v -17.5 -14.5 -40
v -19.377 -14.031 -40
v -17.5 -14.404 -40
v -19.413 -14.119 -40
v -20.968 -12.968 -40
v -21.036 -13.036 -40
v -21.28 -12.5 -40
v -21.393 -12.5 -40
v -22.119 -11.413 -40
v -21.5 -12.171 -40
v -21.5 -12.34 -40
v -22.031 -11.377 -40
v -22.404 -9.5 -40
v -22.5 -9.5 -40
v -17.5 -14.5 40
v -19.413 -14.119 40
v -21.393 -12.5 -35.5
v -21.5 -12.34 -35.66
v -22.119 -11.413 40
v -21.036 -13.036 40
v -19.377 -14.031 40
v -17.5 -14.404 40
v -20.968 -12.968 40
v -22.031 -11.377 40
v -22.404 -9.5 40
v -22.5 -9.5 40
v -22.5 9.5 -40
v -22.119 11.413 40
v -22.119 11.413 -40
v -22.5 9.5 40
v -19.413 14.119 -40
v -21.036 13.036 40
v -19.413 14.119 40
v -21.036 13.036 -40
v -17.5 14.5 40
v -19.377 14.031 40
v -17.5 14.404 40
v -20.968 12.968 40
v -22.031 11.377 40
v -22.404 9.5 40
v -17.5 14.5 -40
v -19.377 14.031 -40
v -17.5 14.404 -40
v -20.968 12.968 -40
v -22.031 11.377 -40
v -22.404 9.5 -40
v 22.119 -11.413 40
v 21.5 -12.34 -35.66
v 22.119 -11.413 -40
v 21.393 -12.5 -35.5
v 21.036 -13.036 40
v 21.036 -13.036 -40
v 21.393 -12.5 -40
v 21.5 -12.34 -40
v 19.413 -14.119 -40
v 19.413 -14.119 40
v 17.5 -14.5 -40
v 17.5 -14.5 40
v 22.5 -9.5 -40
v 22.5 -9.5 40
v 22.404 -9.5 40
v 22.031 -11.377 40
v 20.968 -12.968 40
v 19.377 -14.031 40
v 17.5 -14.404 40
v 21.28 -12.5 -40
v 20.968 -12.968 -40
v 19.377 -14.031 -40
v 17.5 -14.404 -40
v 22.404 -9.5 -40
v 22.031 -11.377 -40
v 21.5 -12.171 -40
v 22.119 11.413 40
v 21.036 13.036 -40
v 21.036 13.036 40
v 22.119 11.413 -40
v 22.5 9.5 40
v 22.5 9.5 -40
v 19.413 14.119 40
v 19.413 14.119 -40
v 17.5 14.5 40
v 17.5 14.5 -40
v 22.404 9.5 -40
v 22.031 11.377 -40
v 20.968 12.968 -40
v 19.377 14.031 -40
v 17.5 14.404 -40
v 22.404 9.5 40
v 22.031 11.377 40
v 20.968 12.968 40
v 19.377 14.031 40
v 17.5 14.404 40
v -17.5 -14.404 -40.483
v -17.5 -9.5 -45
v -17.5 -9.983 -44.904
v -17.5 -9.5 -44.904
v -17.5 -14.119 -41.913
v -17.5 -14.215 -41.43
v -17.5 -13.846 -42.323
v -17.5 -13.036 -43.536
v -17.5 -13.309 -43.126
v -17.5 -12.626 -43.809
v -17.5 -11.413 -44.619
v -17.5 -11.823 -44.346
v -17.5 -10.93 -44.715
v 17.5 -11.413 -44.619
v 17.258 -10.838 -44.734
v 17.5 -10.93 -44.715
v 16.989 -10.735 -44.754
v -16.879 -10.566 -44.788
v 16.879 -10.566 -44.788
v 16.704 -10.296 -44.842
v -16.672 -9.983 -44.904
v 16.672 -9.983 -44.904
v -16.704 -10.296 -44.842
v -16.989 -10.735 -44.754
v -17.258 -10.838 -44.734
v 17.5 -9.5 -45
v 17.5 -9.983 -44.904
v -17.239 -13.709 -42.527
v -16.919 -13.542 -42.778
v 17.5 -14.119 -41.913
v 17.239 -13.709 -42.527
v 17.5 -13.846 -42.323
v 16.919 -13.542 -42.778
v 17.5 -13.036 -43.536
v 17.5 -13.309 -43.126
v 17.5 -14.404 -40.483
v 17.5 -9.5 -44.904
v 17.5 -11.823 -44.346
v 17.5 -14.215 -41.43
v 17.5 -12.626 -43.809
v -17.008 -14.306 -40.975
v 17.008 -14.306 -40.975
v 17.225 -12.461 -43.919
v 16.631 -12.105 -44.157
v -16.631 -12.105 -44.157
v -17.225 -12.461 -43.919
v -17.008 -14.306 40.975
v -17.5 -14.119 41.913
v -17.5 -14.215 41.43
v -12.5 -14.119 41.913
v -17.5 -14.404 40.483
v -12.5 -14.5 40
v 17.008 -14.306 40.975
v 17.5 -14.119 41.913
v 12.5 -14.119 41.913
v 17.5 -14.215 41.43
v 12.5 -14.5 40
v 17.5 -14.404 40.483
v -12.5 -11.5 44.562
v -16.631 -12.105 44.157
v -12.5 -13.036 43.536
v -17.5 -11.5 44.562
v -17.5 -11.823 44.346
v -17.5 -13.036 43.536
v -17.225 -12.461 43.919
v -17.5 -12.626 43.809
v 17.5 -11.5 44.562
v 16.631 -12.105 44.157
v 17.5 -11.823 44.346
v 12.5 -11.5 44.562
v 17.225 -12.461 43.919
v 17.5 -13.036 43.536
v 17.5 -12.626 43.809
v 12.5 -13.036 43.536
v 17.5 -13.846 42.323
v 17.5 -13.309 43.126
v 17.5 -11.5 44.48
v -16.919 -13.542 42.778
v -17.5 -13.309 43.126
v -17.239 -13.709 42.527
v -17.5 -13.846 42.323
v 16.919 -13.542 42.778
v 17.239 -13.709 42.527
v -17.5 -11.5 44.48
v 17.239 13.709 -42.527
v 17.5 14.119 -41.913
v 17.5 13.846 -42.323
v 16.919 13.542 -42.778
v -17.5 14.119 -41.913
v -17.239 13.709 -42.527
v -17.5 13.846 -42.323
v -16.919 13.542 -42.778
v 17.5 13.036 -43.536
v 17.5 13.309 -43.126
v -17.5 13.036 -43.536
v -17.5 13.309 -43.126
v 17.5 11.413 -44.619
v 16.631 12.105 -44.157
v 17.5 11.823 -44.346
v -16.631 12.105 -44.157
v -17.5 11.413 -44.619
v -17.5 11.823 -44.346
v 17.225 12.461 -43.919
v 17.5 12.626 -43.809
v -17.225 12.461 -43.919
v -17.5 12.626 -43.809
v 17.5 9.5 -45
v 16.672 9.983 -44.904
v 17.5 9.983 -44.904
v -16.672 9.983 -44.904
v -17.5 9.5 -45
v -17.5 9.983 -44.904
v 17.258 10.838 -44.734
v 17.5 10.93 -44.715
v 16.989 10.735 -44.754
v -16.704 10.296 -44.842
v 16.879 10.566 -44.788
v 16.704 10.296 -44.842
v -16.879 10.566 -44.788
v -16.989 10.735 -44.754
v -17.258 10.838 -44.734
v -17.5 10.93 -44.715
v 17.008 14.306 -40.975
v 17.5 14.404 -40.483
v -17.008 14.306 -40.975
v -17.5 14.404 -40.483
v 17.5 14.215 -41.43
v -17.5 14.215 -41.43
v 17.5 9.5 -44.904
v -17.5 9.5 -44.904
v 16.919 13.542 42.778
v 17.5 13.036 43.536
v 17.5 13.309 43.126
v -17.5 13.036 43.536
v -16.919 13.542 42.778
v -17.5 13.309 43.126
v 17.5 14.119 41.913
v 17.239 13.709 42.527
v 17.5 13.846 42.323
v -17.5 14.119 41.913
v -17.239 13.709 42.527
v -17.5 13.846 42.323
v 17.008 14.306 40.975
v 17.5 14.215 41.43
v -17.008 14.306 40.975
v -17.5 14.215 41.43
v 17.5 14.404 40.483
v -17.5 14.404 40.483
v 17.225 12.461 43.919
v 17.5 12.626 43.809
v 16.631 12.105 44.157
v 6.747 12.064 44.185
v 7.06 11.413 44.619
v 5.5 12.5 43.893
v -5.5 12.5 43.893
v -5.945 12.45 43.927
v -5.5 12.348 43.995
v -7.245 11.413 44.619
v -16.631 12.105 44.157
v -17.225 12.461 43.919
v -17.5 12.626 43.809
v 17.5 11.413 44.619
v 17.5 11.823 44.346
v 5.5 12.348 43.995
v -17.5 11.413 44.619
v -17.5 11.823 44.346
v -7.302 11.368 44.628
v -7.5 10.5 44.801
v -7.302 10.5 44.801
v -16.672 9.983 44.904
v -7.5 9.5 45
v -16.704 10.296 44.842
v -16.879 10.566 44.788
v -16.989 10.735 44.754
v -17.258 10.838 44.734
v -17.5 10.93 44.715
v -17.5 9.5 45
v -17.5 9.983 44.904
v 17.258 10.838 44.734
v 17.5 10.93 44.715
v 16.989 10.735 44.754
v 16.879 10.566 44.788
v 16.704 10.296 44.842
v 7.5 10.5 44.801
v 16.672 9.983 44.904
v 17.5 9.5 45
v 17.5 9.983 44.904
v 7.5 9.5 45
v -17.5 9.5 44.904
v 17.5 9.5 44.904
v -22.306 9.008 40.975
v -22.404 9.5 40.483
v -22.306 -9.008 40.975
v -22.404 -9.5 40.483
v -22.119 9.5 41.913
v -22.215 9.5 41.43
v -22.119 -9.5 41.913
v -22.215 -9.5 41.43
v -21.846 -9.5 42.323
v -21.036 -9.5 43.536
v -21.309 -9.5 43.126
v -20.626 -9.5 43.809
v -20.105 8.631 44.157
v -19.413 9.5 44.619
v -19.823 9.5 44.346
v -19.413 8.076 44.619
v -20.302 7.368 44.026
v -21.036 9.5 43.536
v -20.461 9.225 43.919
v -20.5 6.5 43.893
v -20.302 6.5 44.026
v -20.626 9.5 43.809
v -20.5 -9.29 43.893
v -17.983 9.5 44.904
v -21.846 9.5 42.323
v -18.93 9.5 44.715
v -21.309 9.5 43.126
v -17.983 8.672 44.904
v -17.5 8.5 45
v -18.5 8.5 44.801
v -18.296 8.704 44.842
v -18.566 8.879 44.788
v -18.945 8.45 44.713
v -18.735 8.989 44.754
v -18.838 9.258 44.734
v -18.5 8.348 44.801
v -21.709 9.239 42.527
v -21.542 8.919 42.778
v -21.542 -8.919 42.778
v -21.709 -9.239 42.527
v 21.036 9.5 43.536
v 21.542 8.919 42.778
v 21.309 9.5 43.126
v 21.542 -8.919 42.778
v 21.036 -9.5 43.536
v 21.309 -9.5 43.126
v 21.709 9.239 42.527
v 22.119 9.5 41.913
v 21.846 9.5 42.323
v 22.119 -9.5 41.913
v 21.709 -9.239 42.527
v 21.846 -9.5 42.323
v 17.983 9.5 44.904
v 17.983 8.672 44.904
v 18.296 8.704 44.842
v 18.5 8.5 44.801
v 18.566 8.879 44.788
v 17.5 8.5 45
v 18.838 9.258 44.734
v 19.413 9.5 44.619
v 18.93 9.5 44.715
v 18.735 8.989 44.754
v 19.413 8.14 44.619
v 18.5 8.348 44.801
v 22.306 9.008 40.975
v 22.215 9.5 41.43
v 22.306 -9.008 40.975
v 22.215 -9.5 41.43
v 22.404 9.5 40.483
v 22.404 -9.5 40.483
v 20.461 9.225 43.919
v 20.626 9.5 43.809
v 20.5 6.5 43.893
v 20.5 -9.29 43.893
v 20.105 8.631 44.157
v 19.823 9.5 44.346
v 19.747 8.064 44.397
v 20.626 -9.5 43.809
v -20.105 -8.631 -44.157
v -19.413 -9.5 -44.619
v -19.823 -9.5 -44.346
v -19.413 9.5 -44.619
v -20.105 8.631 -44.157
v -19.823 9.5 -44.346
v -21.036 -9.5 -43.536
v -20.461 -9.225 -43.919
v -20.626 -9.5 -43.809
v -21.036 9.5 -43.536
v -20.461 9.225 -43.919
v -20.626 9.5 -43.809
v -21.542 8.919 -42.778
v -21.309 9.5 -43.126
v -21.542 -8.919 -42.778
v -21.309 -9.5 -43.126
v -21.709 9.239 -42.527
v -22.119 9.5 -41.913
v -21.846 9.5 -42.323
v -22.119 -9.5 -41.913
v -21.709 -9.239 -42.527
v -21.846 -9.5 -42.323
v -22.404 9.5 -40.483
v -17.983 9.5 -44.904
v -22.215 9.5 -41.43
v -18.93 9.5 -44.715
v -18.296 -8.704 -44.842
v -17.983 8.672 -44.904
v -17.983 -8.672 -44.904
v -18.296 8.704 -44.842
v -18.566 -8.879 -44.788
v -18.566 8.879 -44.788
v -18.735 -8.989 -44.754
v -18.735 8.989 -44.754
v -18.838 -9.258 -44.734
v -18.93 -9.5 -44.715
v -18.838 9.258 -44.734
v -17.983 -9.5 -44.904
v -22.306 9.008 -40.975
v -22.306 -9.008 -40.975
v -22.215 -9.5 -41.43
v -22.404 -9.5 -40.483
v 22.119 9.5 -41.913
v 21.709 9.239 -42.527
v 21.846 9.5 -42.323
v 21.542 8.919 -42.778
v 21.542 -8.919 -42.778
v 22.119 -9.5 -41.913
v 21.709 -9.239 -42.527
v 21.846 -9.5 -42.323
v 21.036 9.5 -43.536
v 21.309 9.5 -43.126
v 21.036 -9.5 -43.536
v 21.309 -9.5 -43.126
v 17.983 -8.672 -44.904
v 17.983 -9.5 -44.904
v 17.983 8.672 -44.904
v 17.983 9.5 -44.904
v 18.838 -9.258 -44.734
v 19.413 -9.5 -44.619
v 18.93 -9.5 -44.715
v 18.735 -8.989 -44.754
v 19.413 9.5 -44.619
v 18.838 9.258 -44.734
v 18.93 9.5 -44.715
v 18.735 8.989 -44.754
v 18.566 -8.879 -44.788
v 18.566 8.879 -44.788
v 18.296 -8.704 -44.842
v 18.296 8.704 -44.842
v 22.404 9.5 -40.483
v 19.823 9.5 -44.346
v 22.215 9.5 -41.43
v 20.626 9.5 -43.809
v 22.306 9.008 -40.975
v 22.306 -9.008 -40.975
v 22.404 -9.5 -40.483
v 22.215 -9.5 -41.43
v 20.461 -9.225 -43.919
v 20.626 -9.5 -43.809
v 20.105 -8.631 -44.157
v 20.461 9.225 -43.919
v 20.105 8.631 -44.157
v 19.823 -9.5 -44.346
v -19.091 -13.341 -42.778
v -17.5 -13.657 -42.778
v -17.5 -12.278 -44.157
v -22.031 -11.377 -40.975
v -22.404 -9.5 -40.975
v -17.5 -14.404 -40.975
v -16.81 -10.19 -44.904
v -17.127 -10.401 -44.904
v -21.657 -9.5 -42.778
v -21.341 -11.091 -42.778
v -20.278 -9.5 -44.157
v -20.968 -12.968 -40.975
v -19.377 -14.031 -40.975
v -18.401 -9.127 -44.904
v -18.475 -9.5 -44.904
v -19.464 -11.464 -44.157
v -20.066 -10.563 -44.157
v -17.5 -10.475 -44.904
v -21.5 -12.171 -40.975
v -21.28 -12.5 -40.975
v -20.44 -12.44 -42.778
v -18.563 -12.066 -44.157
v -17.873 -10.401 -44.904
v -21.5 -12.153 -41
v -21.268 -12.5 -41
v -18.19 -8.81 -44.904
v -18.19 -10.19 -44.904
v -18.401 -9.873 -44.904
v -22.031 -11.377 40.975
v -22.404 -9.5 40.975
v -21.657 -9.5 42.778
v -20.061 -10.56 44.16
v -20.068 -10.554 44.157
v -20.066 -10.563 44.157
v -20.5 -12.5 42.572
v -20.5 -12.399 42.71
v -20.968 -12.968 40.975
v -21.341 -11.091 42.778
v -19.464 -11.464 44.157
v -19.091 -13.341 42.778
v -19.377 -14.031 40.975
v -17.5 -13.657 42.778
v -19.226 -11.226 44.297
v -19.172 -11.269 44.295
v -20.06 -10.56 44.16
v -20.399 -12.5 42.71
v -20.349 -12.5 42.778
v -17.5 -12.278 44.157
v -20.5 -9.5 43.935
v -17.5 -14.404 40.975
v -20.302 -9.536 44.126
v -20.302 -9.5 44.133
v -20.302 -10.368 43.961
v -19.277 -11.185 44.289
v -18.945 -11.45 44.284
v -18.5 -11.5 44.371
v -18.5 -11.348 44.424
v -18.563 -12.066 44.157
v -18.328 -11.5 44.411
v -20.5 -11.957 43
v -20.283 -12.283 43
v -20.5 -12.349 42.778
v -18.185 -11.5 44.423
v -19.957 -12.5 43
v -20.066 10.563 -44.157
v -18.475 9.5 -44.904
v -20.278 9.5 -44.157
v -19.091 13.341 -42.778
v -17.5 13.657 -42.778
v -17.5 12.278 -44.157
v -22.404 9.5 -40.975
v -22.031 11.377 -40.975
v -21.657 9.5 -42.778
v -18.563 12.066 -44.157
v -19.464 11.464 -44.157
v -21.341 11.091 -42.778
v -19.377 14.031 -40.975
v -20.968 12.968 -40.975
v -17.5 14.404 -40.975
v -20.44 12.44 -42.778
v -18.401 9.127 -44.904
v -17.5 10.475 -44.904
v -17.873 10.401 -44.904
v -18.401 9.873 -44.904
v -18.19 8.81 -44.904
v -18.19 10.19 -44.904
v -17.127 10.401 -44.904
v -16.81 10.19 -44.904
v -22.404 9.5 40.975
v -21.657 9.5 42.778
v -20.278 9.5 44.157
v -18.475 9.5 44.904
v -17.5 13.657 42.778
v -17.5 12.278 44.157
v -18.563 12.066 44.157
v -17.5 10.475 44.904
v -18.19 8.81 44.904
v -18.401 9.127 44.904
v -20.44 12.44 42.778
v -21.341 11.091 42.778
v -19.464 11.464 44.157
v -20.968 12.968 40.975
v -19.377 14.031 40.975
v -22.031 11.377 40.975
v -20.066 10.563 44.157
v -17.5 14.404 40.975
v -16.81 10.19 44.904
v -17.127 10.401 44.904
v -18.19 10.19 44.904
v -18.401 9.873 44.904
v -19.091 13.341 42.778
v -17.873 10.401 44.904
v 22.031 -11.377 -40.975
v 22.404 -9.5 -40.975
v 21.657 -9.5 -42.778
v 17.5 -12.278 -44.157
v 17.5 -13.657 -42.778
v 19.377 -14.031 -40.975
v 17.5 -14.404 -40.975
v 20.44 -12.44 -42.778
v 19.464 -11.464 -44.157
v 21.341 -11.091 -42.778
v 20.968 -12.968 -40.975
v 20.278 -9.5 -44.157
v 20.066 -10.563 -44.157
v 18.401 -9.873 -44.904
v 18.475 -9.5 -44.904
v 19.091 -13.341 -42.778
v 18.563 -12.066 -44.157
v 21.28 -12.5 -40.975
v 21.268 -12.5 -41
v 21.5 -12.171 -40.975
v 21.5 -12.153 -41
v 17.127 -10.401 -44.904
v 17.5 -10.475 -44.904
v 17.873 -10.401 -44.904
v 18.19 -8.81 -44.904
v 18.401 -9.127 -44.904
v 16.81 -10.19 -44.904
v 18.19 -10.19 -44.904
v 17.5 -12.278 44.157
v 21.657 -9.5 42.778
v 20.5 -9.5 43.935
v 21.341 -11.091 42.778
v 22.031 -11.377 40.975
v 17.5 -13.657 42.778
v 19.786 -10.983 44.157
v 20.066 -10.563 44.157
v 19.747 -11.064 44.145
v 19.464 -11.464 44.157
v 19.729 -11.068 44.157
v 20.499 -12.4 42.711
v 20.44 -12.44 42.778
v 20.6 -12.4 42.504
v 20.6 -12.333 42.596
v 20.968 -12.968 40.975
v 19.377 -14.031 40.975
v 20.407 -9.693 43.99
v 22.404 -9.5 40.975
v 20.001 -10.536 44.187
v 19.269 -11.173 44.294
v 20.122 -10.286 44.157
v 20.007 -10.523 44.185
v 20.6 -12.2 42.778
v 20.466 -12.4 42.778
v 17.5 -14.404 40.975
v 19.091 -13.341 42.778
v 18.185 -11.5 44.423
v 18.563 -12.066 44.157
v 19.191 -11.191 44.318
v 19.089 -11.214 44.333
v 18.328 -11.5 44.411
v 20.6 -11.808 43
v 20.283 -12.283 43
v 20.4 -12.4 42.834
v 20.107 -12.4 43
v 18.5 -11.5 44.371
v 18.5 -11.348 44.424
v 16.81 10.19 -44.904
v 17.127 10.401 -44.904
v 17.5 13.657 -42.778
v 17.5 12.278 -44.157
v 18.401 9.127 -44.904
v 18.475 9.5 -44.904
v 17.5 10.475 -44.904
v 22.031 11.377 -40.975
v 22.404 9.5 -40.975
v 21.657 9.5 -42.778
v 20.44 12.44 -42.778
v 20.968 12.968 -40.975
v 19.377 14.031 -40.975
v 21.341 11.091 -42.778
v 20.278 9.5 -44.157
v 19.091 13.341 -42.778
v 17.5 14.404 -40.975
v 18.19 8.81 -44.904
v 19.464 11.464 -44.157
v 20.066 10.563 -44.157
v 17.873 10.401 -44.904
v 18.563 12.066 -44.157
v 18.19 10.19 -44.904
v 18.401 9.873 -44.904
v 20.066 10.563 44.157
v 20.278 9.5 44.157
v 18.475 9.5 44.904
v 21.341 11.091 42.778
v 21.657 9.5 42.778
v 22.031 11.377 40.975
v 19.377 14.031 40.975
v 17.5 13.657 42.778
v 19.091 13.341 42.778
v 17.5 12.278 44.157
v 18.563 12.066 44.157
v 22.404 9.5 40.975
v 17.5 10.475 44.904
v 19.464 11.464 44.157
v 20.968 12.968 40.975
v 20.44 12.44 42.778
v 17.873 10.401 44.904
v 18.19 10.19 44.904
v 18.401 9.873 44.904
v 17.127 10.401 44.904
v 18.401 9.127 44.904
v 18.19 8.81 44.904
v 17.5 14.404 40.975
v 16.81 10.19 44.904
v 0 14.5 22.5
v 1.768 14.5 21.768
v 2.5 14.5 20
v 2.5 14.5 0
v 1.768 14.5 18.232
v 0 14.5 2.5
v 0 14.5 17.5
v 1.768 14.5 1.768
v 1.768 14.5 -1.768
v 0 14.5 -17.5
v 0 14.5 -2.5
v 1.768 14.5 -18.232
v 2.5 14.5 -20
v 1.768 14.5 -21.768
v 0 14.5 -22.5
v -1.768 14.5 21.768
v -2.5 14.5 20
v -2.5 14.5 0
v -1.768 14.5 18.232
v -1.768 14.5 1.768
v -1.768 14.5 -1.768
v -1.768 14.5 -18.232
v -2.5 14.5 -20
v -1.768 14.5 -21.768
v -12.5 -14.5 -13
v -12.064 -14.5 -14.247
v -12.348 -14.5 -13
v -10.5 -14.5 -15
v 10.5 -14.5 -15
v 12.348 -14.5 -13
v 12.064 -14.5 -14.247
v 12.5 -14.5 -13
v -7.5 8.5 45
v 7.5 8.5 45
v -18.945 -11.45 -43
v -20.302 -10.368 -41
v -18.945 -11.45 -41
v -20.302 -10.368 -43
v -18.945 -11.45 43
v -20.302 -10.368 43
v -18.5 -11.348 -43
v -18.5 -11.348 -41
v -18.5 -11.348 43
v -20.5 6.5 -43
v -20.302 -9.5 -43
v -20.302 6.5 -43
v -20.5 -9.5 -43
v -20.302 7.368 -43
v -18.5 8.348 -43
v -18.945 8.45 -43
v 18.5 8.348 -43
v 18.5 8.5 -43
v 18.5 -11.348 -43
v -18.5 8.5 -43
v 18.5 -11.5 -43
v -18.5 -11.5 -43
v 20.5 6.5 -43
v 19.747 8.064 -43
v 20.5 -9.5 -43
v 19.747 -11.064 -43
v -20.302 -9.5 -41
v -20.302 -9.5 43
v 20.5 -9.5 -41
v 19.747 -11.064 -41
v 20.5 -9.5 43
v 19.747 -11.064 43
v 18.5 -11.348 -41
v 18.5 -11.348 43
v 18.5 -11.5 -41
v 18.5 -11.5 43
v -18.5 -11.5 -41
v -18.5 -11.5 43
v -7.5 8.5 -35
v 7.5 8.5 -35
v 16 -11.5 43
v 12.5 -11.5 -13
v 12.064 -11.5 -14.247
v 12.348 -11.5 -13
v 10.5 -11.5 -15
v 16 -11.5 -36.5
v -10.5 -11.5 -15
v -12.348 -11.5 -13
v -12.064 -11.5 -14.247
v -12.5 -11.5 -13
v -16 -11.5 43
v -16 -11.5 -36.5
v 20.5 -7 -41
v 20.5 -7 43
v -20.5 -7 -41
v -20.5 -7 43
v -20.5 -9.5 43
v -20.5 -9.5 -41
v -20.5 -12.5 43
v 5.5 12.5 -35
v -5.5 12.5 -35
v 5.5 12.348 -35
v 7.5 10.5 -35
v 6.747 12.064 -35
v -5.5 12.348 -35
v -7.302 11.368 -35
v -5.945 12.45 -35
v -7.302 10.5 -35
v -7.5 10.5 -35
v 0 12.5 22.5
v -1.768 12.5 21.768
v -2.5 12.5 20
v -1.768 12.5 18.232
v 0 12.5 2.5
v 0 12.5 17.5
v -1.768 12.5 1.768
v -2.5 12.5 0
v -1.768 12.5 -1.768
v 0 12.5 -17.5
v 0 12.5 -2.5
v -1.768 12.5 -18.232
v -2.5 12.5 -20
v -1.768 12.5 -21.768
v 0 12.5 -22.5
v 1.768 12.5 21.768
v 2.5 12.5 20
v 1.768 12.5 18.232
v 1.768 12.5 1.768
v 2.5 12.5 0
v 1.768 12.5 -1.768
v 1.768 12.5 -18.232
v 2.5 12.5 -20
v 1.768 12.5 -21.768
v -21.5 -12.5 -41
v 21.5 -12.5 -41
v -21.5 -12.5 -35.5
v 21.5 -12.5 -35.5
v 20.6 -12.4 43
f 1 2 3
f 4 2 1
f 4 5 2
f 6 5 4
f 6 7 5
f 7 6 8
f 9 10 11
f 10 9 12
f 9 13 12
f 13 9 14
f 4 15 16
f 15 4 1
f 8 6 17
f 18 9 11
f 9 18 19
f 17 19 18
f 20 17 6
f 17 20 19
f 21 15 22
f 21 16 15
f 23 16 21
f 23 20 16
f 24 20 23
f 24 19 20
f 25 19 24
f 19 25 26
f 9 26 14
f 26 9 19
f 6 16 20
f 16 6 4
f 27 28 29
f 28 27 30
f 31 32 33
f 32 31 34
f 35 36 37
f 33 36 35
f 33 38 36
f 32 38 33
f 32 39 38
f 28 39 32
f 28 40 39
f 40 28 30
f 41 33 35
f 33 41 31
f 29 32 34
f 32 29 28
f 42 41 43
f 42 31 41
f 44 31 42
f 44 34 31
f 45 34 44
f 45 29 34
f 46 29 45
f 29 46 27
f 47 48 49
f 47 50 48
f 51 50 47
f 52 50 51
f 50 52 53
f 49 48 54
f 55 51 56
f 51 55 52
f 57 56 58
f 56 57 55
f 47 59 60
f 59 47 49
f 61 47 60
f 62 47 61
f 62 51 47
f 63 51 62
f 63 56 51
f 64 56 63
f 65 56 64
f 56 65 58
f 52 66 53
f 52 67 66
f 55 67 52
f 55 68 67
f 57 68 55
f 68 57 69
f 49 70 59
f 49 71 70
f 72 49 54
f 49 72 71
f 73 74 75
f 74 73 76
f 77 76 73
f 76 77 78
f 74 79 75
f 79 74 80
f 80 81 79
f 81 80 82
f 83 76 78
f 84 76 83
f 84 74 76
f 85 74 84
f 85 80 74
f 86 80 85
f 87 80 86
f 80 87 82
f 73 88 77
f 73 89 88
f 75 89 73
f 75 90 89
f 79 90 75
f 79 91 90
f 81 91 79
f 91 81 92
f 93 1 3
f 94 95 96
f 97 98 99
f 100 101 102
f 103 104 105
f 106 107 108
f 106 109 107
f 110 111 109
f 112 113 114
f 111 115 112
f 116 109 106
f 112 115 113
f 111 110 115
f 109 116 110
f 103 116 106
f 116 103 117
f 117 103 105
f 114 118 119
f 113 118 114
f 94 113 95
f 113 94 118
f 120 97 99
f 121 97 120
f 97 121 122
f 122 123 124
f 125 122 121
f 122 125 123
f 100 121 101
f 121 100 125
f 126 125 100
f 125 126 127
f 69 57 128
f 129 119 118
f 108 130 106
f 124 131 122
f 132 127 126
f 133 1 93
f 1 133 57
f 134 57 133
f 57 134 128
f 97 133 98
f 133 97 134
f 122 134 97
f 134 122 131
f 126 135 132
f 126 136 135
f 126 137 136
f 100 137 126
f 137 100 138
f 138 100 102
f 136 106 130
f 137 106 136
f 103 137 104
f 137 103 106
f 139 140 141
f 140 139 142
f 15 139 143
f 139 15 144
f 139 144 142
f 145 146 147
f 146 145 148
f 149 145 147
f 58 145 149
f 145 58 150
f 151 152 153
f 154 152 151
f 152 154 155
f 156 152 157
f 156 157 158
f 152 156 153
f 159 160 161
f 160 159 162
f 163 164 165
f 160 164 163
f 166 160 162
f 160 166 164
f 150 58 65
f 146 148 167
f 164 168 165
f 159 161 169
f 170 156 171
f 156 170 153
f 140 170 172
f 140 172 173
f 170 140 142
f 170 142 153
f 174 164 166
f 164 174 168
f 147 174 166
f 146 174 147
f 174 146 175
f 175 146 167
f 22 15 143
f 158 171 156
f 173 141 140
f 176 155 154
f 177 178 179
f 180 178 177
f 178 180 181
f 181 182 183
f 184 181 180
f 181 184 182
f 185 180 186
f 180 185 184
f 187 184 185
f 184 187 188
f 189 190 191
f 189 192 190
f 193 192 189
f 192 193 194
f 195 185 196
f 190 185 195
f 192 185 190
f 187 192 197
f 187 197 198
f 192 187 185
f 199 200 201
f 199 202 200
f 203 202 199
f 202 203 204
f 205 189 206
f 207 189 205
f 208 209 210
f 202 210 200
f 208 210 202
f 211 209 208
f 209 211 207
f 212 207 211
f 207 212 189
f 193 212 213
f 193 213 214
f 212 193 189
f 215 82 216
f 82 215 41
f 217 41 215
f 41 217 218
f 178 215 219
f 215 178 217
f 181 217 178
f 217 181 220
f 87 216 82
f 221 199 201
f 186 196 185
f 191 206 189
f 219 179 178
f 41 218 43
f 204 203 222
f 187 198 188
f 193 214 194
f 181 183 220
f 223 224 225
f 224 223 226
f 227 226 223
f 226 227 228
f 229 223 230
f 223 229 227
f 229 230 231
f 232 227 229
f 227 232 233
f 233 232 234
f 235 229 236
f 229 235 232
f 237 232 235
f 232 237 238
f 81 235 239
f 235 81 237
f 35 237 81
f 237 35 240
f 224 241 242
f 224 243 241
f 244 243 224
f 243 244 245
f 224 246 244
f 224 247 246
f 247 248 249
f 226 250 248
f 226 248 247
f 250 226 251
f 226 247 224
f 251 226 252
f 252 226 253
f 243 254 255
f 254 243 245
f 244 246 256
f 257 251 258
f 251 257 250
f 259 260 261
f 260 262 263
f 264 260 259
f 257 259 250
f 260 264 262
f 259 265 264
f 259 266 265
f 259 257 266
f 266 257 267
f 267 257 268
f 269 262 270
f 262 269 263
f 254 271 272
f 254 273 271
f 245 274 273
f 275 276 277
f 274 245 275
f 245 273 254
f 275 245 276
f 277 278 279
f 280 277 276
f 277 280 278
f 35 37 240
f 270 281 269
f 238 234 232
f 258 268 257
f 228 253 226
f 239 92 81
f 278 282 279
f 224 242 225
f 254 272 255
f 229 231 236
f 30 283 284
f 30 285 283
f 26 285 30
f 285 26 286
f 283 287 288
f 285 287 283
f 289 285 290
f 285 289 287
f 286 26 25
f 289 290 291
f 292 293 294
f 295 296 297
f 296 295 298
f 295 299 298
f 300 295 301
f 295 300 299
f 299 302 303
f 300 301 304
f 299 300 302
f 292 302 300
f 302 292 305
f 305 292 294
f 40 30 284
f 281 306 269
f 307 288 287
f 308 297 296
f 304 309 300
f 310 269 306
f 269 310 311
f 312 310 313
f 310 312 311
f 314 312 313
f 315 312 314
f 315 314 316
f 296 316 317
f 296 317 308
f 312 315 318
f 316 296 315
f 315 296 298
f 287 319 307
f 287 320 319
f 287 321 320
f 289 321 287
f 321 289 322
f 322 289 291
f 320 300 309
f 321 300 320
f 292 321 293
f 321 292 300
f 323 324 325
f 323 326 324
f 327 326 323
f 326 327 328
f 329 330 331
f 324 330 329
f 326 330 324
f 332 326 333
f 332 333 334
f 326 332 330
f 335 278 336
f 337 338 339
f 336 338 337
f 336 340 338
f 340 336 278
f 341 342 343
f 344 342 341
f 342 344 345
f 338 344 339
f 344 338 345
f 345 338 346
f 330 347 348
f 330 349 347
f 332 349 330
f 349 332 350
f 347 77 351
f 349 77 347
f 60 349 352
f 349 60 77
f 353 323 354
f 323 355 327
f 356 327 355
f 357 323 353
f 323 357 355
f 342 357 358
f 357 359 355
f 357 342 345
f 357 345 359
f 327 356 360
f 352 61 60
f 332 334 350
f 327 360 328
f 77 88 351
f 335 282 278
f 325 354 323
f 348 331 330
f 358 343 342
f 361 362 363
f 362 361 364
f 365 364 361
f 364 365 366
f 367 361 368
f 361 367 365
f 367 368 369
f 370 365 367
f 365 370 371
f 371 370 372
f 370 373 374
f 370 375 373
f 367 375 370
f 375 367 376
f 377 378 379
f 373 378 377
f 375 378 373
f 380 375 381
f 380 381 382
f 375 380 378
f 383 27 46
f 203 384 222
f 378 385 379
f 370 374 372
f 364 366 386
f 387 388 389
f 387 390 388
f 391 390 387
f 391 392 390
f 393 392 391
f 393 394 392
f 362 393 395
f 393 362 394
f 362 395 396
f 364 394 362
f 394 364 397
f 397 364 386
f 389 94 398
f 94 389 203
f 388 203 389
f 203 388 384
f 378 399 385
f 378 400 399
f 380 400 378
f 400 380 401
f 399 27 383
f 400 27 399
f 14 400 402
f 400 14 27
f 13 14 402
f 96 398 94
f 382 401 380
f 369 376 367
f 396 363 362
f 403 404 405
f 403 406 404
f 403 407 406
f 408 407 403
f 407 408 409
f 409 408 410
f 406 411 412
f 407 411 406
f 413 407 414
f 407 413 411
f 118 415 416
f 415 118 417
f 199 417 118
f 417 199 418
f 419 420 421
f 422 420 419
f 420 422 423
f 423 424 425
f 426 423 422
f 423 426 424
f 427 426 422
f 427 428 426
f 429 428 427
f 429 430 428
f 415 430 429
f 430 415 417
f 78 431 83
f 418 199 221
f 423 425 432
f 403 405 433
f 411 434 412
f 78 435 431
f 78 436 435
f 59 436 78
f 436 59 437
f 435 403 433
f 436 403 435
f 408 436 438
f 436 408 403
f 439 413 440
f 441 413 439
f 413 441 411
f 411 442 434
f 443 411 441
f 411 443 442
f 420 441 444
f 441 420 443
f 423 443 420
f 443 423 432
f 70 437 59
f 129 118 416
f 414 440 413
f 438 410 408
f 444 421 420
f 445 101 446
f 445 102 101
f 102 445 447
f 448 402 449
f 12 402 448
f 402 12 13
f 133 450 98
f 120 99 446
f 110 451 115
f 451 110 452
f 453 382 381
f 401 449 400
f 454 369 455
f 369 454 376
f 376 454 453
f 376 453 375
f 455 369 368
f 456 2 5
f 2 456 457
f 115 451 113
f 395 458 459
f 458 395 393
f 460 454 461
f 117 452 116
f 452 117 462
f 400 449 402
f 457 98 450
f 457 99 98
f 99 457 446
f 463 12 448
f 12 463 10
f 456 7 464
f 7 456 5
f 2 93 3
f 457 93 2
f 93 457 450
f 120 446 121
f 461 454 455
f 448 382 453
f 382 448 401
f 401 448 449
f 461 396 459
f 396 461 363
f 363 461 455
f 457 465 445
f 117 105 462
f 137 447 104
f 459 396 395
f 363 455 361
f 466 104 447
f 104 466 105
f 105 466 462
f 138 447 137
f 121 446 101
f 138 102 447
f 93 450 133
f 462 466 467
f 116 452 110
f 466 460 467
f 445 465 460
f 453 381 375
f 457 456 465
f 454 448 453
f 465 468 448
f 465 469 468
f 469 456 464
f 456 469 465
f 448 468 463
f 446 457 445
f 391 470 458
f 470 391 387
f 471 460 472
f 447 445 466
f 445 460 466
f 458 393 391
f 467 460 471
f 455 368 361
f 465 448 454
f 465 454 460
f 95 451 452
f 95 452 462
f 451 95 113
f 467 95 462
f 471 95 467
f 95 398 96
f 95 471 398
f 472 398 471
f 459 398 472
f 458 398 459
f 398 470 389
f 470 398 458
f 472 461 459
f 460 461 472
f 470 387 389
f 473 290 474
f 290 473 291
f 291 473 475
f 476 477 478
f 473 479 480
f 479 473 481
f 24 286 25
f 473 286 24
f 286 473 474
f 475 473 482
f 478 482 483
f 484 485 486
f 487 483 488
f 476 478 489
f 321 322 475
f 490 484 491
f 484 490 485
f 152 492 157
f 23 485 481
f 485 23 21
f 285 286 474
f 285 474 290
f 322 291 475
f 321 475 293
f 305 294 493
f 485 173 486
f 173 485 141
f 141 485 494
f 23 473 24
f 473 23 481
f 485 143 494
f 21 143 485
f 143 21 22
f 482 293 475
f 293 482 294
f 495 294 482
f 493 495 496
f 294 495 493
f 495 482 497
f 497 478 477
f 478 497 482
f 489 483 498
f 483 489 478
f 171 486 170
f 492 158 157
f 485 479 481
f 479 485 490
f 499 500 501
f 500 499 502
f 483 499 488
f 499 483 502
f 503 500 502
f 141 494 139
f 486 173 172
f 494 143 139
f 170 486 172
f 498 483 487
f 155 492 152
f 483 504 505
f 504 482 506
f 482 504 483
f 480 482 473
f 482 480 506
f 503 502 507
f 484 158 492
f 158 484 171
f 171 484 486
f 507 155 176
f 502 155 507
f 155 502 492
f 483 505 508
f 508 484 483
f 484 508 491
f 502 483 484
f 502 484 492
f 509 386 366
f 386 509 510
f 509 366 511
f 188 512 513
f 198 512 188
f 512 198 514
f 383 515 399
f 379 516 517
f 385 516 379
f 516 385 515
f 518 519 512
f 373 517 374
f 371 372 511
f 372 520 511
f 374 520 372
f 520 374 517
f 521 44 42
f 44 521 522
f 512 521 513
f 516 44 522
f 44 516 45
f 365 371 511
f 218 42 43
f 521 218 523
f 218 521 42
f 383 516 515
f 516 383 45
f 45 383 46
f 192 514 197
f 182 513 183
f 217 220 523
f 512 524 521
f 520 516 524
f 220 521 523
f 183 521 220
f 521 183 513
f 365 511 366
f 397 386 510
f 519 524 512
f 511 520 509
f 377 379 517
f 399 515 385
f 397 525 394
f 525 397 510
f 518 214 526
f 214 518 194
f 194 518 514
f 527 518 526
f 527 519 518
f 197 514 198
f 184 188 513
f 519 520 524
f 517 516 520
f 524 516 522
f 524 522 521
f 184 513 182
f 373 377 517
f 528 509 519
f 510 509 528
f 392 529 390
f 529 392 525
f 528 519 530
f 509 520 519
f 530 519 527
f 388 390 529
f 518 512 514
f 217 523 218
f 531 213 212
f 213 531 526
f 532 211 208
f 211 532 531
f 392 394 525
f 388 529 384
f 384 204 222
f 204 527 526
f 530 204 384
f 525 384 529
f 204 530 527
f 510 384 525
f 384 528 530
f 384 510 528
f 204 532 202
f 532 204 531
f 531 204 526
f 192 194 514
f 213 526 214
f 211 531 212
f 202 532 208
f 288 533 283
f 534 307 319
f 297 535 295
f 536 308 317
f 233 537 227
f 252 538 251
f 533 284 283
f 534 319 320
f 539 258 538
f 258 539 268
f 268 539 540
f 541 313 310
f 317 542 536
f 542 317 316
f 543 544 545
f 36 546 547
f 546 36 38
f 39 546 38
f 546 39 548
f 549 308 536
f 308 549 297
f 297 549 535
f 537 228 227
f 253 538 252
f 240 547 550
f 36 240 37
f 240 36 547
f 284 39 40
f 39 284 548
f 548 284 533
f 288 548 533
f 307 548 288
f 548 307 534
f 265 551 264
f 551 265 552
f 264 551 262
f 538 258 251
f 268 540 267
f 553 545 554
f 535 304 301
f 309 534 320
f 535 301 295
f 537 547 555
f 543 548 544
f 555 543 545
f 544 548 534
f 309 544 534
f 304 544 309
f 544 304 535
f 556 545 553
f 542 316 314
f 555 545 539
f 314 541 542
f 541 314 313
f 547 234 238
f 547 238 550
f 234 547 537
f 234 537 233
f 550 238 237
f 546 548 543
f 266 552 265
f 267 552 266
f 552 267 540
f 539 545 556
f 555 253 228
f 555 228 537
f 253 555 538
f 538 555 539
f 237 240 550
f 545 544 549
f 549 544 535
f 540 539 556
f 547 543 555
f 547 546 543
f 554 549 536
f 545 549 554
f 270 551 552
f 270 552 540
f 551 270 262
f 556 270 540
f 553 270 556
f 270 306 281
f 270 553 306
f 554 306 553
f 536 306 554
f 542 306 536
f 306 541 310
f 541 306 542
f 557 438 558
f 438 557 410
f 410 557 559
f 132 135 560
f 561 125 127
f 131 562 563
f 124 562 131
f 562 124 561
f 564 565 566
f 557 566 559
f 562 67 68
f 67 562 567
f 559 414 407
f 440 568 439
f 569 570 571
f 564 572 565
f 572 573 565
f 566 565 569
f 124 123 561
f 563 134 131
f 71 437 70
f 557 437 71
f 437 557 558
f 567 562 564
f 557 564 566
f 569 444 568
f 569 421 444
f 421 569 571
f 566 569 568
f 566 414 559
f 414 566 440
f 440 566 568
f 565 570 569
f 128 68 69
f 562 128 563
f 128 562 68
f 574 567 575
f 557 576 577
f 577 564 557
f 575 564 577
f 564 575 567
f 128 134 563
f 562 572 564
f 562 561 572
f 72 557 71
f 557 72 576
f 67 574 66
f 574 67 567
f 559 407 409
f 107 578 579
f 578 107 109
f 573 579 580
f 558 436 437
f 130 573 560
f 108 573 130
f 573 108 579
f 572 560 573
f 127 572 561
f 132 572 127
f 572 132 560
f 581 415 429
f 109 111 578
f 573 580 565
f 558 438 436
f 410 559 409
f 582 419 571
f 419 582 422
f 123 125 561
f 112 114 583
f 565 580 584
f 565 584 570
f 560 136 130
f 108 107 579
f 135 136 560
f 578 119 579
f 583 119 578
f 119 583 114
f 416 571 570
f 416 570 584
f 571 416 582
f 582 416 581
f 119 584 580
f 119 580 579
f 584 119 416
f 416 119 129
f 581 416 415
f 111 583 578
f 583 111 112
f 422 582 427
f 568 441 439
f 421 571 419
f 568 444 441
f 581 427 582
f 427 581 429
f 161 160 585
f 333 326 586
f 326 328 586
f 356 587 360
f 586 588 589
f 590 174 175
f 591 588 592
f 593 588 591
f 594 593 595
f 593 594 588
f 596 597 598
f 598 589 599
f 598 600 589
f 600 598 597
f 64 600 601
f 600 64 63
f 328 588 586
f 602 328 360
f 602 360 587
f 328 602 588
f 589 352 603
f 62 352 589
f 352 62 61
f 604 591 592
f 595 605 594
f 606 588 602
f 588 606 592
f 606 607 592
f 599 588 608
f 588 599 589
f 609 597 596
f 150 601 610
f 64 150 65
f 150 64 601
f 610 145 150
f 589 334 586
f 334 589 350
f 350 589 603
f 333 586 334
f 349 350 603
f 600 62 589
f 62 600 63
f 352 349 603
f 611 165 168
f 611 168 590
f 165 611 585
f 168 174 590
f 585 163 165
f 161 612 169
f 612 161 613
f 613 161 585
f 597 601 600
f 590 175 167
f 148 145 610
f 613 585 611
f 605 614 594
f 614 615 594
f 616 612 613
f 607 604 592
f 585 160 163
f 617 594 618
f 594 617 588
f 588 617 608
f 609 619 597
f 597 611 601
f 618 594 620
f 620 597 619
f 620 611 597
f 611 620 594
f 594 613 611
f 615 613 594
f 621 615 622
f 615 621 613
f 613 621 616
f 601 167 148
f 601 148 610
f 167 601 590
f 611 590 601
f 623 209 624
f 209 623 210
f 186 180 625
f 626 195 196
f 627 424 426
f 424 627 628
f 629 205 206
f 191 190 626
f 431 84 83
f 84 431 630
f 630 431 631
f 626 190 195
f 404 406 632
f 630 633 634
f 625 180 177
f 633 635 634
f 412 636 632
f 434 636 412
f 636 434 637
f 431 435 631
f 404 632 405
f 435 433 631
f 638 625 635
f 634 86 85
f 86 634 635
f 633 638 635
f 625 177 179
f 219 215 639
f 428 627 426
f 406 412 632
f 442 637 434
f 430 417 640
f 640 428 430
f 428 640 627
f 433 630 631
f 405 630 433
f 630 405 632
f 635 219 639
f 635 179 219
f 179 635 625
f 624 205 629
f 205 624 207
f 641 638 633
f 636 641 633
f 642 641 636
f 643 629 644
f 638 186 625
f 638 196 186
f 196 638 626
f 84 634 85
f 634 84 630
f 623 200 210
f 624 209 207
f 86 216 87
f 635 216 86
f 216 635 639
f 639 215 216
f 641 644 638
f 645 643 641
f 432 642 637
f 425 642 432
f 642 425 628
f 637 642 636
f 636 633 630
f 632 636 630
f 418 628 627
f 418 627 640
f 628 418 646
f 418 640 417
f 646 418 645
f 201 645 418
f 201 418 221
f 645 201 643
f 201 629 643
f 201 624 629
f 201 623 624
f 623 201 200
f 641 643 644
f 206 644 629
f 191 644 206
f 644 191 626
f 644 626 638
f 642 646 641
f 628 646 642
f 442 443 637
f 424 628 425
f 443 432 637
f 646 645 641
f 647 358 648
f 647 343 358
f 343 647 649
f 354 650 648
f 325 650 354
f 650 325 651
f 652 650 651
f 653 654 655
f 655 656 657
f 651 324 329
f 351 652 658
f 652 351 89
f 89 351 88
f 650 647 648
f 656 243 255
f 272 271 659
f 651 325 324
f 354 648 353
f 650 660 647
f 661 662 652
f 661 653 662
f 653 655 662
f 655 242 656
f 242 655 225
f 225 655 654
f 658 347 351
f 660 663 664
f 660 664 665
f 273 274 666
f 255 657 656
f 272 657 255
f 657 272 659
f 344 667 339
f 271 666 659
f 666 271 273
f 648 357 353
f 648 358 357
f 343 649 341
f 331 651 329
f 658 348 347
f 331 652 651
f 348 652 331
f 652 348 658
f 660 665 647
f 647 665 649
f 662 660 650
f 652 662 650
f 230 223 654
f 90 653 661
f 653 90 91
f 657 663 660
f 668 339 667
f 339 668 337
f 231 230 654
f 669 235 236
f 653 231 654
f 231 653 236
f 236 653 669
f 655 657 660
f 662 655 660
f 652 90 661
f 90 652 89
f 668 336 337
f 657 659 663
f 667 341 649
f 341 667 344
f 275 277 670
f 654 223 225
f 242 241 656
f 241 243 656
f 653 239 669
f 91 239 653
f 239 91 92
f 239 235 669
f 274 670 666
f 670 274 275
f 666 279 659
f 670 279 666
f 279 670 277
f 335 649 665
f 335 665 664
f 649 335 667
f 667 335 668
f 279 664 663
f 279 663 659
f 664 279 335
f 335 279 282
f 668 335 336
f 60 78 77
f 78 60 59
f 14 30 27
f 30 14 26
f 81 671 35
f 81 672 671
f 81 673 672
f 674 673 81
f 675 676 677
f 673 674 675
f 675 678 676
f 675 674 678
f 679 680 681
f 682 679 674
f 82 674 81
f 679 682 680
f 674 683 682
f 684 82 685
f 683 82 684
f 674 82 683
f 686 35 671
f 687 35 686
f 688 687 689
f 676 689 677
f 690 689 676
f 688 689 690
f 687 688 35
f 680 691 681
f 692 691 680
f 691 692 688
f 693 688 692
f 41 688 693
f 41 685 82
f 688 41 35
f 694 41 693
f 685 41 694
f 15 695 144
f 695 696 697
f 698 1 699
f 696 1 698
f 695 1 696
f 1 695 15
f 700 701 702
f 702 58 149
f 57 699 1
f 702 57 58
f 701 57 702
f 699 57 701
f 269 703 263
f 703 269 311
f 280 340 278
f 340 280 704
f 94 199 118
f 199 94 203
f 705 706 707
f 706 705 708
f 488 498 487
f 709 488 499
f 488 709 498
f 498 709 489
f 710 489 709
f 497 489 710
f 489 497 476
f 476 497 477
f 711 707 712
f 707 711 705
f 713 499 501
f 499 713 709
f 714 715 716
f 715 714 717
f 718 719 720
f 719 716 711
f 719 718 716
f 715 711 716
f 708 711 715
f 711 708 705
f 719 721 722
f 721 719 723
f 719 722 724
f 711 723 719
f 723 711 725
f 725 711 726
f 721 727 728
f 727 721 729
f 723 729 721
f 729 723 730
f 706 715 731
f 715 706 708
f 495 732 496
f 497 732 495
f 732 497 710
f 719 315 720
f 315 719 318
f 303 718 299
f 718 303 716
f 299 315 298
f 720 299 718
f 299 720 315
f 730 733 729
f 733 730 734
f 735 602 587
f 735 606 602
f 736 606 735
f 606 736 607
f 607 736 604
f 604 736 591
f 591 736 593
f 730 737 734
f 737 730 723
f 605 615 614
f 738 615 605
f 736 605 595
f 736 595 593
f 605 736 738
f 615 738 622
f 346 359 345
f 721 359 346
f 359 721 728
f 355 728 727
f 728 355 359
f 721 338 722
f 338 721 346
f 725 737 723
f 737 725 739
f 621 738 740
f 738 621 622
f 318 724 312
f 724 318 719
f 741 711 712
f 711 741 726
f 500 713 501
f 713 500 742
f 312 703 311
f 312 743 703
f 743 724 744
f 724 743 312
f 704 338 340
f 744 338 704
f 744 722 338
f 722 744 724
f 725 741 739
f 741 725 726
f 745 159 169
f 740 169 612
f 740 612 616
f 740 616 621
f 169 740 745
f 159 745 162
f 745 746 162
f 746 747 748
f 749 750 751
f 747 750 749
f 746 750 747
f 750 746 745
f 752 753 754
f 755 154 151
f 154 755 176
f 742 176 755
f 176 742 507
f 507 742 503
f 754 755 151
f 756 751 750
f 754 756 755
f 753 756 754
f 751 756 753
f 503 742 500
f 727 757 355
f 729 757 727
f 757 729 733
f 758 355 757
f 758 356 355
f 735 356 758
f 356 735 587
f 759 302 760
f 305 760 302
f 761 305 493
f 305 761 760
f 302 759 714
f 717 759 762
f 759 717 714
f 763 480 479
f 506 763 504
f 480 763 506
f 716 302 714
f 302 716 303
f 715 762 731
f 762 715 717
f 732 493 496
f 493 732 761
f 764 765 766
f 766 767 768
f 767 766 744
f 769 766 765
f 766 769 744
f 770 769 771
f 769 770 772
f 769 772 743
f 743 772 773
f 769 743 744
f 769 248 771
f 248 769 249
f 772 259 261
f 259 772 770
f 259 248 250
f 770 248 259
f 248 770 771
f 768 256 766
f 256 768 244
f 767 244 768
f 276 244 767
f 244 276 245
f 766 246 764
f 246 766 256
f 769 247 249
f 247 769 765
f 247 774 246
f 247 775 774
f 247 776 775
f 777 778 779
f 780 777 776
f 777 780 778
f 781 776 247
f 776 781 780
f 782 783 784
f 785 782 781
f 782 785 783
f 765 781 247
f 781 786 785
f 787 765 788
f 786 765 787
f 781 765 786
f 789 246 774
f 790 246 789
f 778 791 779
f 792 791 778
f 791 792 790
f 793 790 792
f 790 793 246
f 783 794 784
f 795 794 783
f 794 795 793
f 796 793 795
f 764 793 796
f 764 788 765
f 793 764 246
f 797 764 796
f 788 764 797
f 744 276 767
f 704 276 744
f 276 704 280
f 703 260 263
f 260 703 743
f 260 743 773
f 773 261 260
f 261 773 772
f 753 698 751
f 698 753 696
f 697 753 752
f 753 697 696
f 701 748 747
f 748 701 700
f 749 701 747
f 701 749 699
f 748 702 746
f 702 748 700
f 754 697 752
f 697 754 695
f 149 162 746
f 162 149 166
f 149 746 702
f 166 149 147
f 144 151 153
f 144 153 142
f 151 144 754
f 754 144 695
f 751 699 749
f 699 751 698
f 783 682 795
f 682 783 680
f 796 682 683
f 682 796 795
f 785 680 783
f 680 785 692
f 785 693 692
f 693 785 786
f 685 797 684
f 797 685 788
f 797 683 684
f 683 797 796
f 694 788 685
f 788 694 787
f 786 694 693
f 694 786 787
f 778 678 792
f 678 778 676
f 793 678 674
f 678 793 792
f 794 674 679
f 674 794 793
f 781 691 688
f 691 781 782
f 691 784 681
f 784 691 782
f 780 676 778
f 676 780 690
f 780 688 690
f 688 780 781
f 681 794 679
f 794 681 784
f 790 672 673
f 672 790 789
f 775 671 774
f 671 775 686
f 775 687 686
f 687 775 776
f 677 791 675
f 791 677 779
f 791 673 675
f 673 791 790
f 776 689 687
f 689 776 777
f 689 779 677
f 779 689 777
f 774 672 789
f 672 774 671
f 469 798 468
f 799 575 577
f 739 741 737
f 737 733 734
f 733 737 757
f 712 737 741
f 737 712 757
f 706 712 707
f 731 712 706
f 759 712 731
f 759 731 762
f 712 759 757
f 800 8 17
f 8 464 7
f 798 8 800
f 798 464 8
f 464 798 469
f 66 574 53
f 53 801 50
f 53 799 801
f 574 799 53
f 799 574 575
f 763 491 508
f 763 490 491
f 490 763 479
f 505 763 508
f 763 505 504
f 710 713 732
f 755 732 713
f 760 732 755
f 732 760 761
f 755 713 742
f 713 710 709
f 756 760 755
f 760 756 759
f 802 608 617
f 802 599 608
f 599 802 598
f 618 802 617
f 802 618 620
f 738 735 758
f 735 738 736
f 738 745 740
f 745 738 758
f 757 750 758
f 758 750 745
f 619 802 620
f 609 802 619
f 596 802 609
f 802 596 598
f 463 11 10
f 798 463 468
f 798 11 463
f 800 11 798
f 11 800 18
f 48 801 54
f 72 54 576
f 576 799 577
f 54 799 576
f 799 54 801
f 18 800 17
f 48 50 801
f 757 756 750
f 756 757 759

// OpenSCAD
// [FL_INDEX: keywords="openscad, 3d_parametric, Parametric_Remote_Control_Holder, csg_solid" | COT="Parametric OpenSCAD design from 3DCodeverse"]
// Title: Parametric Remote Control Holder

//--------------------------------------------------------------------
//	Filename:	RemoteControlHolder.scad
//	Author:		Robert H. Morrison (rhmorrison)
//	Created On:	15 October 2011
//--------------------------------------------------------------------

use <MCAD/boxes.scad>;

AddTriangles=1;	//[0:No,1:Yes]

KT=20;			// Remote Control Thickness
ST=5;			// Screw head Thickness
T=2;			// Thickness of walls
BD=KT+ST+2*T;	// Box Depth
BW=45;			// Box Width
BL=90;			// Box Length
FW=25;			// Front Hole Width

module Triangle(h) {
	linear_extrude(height=h, center=false, convexity=10, twist=0)
		polygon(
			points=[[0,0],[0,5.5],[5.5,5.5]],
			paths=[[0,1,2]]);
}

module BracketHoles() {
	for (i=[-20, 0, 20])
	{
		translate([0,KT/2,i])
			rotate([90,0,0])
				cylinder(h=KT, r=2.5, center=true);
	}
}

module RemoteControlBracket() {
	union() {
		difference() {
			roundedBox([BW,BD,BL], 5, false);			// Holder frame
			translate([0,-(ST-T)/2,T])
				roundedBox([BW-2*T,KT,BL], 2, true);	// Remote Control
			translate([0,ST/2,10])
				roundedBox([BW/3,KT,BL], 2, true);  	// Screw heads
			translate([0,-(KT+ST+T)/2,30])
				rotate([90,90,0])
					roundedBox([BL,FW,ST], 2, true);  // Cut-out FRONT
			BracketHoles();
		}

		if (AddTriangles)
		{
			translate([T+5.5-BW/2,T-BD/2,2*T-BL/2])
				rotate([0,0,90])
					Triangle(BL-T*3);						// LL corner
			translate([BW/2-T+0.1,T+5.6-BD/2,2*T-BL/2])
				rotate([0,0,180])
					Triangle(BL-T*3);						// LR corner
			translate([T/2-BW/2, 5.5+T-BD/2, 6-T-BL/2])
				rotate([0,90,0])
					rotate([0,0,180])
						Triangle(BW-T);					// Bottom
		}
	}
}

RemoteControlBracket();
